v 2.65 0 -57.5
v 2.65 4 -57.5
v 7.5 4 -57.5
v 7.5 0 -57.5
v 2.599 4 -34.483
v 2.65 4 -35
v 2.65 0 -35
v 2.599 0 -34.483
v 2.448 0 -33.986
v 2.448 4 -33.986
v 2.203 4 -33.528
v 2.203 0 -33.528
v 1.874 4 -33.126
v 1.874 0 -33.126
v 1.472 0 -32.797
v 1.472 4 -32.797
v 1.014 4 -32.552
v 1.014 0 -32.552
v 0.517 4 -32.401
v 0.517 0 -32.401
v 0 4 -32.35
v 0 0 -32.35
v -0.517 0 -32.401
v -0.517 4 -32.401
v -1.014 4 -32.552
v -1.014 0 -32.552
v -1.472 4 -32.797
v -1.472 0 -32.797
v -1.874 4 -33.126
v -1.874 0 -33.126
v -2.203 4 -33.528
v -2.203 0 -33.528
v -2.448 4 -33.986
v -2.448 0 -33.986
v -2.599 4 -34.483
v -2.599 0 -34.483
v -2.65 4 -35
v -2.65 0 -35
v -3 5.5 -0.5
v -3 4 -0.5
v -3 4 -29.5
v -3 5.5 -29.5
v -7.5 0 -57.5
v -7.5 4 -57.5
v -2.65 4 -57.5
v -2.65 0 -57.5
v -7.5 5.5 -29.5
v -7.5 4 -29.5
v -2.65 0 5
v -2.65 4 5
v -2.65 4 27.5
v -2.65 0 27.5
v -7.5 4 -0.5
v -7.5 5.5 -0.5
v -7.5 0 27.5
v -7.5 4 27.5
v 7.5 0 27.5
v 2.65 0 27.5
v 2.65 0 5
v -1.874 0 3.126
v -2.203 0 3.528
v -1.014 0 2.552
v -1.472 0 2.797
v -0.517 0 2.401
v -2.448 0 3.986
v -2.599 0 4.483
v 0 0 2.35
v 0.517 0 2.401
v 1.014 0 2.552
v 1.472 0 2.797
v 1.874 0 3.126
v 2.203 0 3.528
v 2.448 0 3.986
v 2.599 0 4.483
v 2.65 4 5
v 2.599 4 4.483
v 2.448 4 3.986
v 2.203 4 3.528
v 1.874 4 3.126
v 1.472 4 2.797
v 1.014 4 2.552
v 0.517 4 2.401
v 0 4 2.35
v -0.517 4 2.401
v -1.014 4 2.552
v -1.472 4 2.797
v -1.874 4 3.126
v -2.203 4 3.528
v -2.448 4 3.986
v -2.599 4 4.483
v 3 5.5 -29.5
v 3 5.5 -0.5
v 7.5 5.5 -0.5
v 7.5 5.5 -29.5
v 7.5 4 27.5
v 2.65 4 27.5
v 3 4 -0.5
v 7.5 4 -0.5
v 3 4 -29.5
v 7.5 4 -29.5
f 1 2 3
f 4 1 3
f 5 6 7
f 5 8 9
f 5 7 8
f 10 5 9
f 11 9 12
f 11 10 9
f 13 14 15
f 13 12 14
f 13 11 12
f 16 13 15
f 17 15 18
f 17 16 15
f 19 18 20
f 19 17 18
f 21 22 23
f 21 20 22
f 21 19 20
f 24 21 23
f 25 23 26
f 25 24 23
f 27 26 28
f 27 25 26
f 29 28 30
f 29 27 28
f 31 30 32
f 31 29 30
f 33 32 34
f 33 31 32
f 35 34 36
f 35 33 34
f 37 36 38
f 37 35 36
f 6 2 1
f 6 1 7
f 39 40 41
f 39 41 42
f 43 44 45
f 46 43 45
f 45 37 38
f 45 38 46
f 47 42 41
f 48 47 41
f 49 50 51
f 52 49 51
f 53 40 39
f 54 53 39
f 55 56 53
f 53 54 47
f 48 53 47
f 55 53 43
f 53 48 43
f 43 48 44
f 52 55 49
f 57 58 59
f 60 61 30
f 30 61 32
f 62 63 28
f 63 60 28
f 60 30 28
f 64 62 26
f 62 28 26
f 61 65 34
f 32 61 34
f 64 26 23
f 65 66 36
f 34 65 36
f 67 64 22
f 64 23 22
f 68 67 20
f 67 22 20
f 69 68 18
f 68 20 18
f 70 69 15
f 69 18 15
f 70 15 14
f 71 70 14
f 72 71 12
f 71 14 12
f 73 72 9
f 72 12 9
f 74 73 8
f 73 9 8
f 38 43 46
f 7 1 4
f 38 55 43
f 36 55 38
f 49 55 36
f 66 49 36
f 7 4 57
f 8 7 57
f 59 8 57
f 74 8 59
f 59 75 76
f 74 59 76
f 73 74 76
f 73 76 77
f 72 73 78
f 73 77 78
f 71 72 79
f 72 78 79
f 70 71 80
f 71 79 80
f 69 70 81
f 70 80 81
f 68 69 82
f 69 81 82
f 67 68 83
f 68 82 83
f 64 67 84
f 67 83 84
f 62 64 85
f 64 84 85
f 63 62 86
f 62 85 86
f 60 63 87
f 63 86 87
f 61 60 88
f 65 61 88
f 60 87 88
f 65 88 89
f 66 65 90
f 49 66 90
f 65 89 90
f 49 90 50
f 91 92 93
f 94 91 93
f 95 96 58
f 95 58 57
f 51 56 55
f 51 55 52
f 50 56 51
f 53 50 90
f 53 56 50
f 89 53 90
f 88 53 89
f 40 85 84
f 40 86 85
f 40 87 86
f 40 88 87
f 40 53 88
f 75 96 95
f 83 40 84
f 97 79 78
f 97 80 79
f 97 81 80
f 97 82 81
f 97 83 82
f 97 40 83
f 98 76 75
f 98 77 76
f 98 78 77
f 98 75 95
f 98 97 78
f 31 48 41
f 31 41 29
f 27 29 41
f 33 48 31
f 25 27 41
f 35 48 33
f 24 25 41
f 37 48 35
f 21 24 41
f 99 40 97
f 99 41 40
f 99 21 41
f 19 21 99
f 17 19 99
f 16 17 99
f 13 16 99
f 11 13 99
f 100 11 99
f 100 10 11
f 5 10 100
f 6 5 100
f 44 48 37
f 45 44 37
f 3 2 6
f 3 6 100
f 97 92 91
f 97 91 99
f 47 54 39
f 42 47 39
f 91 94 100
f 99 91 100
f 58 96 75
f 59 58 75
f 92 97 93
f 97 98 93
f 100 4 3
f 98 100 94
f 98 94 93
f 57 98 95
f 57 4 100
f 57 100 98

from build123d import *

# Parameters (mm, degrees)
BOSS_EXTRUDE1_DEPTH    = 3.175
SKETCH2_W              = 15
SKETCH2_H              = 55
BOSS_EXTRUDE2_DEPTH    = 5.5
CUT_EXTRUDE1_DEPTH     = 47.569840025
FILLET1_R              = 20
SKETCH6_W              = 31.616763165
SKETCH6_H              = 17.5
CUT_EXTRUDE3_DEPTH     = 50.489449633
BOSS_EXTRUDE4_DEPTH    = 3
FILLET3_R              = 5
SKETCH9_W              = 13
SKETCH9_H              = 1.5
CUT_EXTRUDE4_DEPTH     = 51.855333187
SPLIT1_SURFACE_1_BACK  = 62.685
SPLIT1_SURFACE_1_DEPTH = 125.37
SPLIT1_SURFACE_2_BACK  = 62.685
SPLIT1_SURFACE_2_DEPTH = 125.37
SKETCH12_W             = 4.85
SKETCH12_H             = 15
BOSS_EXTRUDE5_DEPTH    = 4


with BuildPart() as part:
    # Sketch1 → Boss-Extrude1 (new, symmetric)
    with BuildSketch(Plane(origin=(0, 0, 0), x_dir=(0, 0, -1), z_dir=(1, 0, 0))):
        Polygon((0, 0), (0, 23), (20, 23), (30, 6), (30, 0), align=None)
    extrude(amount=BOSS_EXTRUDE1_DEPTH, both=True)

    # Sketch2 → Boss-Extrude2 (add)
    with BuildSketch(Plane.XZ):
        with Locations((0, -15)):
            Rectangle(SKETCH2_W, SKETCH2_H)
    extrude(amount=-BOSS_EXTRUDE2_DEPTH)

    # Sketch3 → Cut-Extrude1 (cut, through all)
    with BuildSketch(Plane(origin=(0, 5.5, 0), x_dir=(1, 0, 0), z_dir=(0, 1, 0))):
        with BuildLine():
            Line((2.65, 45), (2.65, 35))
            ThreePointArc((2.65, 35), (0, 32.35), (-2.65, 35))
            Line((-2.65, 35), (-2.65, 45))
            ThreePointArc((-2.65, 45), (0, 47.65), (2.65, 45))
        make_face()
        with BuildLine():
            Line((2.65, -15), (2.65, -5))
            ThreePointArc((2.65, -5), (0, -2.35), (-2.65, -5))
            Line((-2.65, -5), (-2.65, -15))
            ThreePointArc((-2.65, -15), (0, -17.65), (2.65, -15))
        make_face()
    extrude(amount=-CUT_EXTRUDE1_DEPTH, mode=Mode.SUBTRACT)

    # Fillet1
    fillet1_edges = [part.edges().sort_by_distance(p)[0] for p in [
        (0, 23, -20),
    ]]
    fillet(fillet1_edges, radius=FILLET1_R)

    # Sketch6 → Cut-Extrude3 (cut, through all)
    with BuildSketch(Plane(origin=(3.175, 0, 0), x_dir=(0, 0, -1), z_dir=(1, 0, 0))):
        with Locations((15.808381583, 14.25)):
            Rectangle(SKETCH6_W, SKETCH6_H)
    extrude(amount=-CUT_EXTRUDE3_DEPTH, mode=Mode.SUBTRACT)

    # Sketch7 → Boss-Extrude4 (add, symmetric)
    with BuildSketch(Plane(origin=(0, 0, 0), x_dir=(0, 0, -1), z_dir=(1, 0, 0))):
        Polygon((0.5, 5.5), (0.5, 15.105993457), (24.253814646, 15.105993457), (24.253814646, 23.558754498), (33.902459411, 23.558754498), (33.902459411, 12.772125994), (29.5, 12.772125994), (29.5, 5.5), (15, 5.5), align=None)
    extrude(amount=BOSS_EXTRUDE4_DEPTH, both=True)

    # Fillet3
    # the kernel refuses this fillet: 5 mm, written as the material it adds along each edge
    with BuildSketch(Plane(origin=(3, 12.772125994, -29.5), x_dir=(0, -1, 0), z_dir=(-1, 0, 0))) as fillet3_piece_1:
        with BuildLine():
            CenterArc((4.964166118, -5), FILLET3_R, 90, 83.136284475)
            Line((0, -4.402459411), (0, 0))
            Line((0, 0), (4.964166118, 0))
        make_face()
    extrude(amount=6)
    with BuildSketch(Plane(origin=(3, 15.105993457, -24.253814646), x_dir=(0, 0, 1), z_dir=(-1, 0, 0))) as fillet3_piece_2:
        with BuildLine():
            CenterArc((FILLET3_R, FILLET3_R), FILLET3_R, 180, 90)
            Line((0, FILLET3_R), (0, 0))
            Line((0, 0), (FILLET3_R, 0))
        make_face()
    extrude(amount=6)
    # the kernel refuses this fillet: 5 mm, written as the material it takes off along each edge
    with BuildSketch(Plane(origin=(15.5, 15.105993457, -0.5), x_dir=(0, -1, 0), z_dir=(-1, 0, 0))) as fillet3_2_piece_1:
        with BuildLine():
            CenterArc((FILLET3_R, -FILLET3_R), FILLET3_R, 90, 90)
            Line((0, -FILLET3_R), (0, 0))
            Line((0, 0), (FILLET3_R, 0))
        make_face()
    extrude(amount=31, mode=Mode.SUBTRACT)

    # Sketch9 → Cut-Extrude4 (cut, through all)
    with BuildSketch(Plane(origin=(7.5, 0, 0), x_dir=(0, 0, -1), z_dir=(1, 0, 0))):
        with Locations((-6, 4.75)):
            Rectangle(SKETCH9_W, SKETCH9_H)
        with Locations((36, 4.75)):
            Rectangle(SKETCH9_W, SKETCH9_H)
    extrude(amount=-CUT_EXTRUDE4_DEPTH, mode=Mode.SUBTRACT)


with BuildPart() as body_2:
    # Split1: the piece behind the surface
    add(part.part)
    # Split1 surface: a surface, the sketch's curves swept straight by 125.37 mm
    with BuildLine(Plane(origin=(0, 0, -29.5), x_dir=(-1, 0, 0), z_dir=(0, 0, -1)).offset(-SPLIT1_SURFACE_1_BACK), mode=Mode.PRIVATE) as split1_surface_1_path:
        Line((-3, 7.807959877), (-3, 4))
        Line((-3, 4), (3, 4))
        Line((3, 4), (3, 7.807959877))
    split1_surface_1 = Shell.extrude(split1_surface_1_path.wire(), (0 * SPLIT1_SURFACE_1_DEPTH, 0 * SPLIT1_SURFACE_1_DEPTH, -1 * SPLIT1_SURFACE_1_DEPTH))
    split(bisect_by=split1_surface_1, keep=Keep.BOTTOM)

    # Sketch12 → Boss-Extrude5 (add)
    with BuildSketch(Plane(origin=(0, 4, 0), x_dir=(1, 0, 0), z_dir=(0, 1, 0))):
        with Locations((-5.075, 50)):
            Rectangle(SKETCH12_W, SKETCH12_H)
        with Locations((5.075, 50)):
            Rectangle(SKETCH12_W, SKETCH12_H)
        with Locations((-5.075, -20)):
            Rectangle(SKETCH12_W, SKETCH12_H)
        with Locations((5.075, -20)):
            Rectangle(SKETCH12_W, SKETCH12_H)
    extrude(amount=-BOSS_EXTRUDE5_DEPTH)


with BuildPart() as part_1:
    add(part.part)

    # Split1: split by a surface, the side it looks to stays
    # Split1 surface: a surface, the sketch's curves swept straight by 125.37 mm
    with BuildLine(Plane(origin=(0, 0, -29.5), x_dir=(-1, 0, 0), z_dir=(0, 0, -1)).offset(-SPLIT1_SURFACE_2_BACK), mode=Mode.PRIVATE) as split1_surface_2_path:
        Line((-3, 7.807959877), (-3, 4))
        Line((-3, 4), (3, 4))
        Line((3, 4), (3, 7.807959877))
    split1_surface_2 = Shell.extrude(split1_surface_2_path.wire(), (0 * SPLIT1_SURFACE_2_DEPTH, 0 * SPLIT1_SURFACE_2_DEPTH, -1 * SPLIT1_SURFACE_2_DEPTH))
    split(bisect_by=split1_surface_2, keep=Keep.TOP)


solid = body_2.part
